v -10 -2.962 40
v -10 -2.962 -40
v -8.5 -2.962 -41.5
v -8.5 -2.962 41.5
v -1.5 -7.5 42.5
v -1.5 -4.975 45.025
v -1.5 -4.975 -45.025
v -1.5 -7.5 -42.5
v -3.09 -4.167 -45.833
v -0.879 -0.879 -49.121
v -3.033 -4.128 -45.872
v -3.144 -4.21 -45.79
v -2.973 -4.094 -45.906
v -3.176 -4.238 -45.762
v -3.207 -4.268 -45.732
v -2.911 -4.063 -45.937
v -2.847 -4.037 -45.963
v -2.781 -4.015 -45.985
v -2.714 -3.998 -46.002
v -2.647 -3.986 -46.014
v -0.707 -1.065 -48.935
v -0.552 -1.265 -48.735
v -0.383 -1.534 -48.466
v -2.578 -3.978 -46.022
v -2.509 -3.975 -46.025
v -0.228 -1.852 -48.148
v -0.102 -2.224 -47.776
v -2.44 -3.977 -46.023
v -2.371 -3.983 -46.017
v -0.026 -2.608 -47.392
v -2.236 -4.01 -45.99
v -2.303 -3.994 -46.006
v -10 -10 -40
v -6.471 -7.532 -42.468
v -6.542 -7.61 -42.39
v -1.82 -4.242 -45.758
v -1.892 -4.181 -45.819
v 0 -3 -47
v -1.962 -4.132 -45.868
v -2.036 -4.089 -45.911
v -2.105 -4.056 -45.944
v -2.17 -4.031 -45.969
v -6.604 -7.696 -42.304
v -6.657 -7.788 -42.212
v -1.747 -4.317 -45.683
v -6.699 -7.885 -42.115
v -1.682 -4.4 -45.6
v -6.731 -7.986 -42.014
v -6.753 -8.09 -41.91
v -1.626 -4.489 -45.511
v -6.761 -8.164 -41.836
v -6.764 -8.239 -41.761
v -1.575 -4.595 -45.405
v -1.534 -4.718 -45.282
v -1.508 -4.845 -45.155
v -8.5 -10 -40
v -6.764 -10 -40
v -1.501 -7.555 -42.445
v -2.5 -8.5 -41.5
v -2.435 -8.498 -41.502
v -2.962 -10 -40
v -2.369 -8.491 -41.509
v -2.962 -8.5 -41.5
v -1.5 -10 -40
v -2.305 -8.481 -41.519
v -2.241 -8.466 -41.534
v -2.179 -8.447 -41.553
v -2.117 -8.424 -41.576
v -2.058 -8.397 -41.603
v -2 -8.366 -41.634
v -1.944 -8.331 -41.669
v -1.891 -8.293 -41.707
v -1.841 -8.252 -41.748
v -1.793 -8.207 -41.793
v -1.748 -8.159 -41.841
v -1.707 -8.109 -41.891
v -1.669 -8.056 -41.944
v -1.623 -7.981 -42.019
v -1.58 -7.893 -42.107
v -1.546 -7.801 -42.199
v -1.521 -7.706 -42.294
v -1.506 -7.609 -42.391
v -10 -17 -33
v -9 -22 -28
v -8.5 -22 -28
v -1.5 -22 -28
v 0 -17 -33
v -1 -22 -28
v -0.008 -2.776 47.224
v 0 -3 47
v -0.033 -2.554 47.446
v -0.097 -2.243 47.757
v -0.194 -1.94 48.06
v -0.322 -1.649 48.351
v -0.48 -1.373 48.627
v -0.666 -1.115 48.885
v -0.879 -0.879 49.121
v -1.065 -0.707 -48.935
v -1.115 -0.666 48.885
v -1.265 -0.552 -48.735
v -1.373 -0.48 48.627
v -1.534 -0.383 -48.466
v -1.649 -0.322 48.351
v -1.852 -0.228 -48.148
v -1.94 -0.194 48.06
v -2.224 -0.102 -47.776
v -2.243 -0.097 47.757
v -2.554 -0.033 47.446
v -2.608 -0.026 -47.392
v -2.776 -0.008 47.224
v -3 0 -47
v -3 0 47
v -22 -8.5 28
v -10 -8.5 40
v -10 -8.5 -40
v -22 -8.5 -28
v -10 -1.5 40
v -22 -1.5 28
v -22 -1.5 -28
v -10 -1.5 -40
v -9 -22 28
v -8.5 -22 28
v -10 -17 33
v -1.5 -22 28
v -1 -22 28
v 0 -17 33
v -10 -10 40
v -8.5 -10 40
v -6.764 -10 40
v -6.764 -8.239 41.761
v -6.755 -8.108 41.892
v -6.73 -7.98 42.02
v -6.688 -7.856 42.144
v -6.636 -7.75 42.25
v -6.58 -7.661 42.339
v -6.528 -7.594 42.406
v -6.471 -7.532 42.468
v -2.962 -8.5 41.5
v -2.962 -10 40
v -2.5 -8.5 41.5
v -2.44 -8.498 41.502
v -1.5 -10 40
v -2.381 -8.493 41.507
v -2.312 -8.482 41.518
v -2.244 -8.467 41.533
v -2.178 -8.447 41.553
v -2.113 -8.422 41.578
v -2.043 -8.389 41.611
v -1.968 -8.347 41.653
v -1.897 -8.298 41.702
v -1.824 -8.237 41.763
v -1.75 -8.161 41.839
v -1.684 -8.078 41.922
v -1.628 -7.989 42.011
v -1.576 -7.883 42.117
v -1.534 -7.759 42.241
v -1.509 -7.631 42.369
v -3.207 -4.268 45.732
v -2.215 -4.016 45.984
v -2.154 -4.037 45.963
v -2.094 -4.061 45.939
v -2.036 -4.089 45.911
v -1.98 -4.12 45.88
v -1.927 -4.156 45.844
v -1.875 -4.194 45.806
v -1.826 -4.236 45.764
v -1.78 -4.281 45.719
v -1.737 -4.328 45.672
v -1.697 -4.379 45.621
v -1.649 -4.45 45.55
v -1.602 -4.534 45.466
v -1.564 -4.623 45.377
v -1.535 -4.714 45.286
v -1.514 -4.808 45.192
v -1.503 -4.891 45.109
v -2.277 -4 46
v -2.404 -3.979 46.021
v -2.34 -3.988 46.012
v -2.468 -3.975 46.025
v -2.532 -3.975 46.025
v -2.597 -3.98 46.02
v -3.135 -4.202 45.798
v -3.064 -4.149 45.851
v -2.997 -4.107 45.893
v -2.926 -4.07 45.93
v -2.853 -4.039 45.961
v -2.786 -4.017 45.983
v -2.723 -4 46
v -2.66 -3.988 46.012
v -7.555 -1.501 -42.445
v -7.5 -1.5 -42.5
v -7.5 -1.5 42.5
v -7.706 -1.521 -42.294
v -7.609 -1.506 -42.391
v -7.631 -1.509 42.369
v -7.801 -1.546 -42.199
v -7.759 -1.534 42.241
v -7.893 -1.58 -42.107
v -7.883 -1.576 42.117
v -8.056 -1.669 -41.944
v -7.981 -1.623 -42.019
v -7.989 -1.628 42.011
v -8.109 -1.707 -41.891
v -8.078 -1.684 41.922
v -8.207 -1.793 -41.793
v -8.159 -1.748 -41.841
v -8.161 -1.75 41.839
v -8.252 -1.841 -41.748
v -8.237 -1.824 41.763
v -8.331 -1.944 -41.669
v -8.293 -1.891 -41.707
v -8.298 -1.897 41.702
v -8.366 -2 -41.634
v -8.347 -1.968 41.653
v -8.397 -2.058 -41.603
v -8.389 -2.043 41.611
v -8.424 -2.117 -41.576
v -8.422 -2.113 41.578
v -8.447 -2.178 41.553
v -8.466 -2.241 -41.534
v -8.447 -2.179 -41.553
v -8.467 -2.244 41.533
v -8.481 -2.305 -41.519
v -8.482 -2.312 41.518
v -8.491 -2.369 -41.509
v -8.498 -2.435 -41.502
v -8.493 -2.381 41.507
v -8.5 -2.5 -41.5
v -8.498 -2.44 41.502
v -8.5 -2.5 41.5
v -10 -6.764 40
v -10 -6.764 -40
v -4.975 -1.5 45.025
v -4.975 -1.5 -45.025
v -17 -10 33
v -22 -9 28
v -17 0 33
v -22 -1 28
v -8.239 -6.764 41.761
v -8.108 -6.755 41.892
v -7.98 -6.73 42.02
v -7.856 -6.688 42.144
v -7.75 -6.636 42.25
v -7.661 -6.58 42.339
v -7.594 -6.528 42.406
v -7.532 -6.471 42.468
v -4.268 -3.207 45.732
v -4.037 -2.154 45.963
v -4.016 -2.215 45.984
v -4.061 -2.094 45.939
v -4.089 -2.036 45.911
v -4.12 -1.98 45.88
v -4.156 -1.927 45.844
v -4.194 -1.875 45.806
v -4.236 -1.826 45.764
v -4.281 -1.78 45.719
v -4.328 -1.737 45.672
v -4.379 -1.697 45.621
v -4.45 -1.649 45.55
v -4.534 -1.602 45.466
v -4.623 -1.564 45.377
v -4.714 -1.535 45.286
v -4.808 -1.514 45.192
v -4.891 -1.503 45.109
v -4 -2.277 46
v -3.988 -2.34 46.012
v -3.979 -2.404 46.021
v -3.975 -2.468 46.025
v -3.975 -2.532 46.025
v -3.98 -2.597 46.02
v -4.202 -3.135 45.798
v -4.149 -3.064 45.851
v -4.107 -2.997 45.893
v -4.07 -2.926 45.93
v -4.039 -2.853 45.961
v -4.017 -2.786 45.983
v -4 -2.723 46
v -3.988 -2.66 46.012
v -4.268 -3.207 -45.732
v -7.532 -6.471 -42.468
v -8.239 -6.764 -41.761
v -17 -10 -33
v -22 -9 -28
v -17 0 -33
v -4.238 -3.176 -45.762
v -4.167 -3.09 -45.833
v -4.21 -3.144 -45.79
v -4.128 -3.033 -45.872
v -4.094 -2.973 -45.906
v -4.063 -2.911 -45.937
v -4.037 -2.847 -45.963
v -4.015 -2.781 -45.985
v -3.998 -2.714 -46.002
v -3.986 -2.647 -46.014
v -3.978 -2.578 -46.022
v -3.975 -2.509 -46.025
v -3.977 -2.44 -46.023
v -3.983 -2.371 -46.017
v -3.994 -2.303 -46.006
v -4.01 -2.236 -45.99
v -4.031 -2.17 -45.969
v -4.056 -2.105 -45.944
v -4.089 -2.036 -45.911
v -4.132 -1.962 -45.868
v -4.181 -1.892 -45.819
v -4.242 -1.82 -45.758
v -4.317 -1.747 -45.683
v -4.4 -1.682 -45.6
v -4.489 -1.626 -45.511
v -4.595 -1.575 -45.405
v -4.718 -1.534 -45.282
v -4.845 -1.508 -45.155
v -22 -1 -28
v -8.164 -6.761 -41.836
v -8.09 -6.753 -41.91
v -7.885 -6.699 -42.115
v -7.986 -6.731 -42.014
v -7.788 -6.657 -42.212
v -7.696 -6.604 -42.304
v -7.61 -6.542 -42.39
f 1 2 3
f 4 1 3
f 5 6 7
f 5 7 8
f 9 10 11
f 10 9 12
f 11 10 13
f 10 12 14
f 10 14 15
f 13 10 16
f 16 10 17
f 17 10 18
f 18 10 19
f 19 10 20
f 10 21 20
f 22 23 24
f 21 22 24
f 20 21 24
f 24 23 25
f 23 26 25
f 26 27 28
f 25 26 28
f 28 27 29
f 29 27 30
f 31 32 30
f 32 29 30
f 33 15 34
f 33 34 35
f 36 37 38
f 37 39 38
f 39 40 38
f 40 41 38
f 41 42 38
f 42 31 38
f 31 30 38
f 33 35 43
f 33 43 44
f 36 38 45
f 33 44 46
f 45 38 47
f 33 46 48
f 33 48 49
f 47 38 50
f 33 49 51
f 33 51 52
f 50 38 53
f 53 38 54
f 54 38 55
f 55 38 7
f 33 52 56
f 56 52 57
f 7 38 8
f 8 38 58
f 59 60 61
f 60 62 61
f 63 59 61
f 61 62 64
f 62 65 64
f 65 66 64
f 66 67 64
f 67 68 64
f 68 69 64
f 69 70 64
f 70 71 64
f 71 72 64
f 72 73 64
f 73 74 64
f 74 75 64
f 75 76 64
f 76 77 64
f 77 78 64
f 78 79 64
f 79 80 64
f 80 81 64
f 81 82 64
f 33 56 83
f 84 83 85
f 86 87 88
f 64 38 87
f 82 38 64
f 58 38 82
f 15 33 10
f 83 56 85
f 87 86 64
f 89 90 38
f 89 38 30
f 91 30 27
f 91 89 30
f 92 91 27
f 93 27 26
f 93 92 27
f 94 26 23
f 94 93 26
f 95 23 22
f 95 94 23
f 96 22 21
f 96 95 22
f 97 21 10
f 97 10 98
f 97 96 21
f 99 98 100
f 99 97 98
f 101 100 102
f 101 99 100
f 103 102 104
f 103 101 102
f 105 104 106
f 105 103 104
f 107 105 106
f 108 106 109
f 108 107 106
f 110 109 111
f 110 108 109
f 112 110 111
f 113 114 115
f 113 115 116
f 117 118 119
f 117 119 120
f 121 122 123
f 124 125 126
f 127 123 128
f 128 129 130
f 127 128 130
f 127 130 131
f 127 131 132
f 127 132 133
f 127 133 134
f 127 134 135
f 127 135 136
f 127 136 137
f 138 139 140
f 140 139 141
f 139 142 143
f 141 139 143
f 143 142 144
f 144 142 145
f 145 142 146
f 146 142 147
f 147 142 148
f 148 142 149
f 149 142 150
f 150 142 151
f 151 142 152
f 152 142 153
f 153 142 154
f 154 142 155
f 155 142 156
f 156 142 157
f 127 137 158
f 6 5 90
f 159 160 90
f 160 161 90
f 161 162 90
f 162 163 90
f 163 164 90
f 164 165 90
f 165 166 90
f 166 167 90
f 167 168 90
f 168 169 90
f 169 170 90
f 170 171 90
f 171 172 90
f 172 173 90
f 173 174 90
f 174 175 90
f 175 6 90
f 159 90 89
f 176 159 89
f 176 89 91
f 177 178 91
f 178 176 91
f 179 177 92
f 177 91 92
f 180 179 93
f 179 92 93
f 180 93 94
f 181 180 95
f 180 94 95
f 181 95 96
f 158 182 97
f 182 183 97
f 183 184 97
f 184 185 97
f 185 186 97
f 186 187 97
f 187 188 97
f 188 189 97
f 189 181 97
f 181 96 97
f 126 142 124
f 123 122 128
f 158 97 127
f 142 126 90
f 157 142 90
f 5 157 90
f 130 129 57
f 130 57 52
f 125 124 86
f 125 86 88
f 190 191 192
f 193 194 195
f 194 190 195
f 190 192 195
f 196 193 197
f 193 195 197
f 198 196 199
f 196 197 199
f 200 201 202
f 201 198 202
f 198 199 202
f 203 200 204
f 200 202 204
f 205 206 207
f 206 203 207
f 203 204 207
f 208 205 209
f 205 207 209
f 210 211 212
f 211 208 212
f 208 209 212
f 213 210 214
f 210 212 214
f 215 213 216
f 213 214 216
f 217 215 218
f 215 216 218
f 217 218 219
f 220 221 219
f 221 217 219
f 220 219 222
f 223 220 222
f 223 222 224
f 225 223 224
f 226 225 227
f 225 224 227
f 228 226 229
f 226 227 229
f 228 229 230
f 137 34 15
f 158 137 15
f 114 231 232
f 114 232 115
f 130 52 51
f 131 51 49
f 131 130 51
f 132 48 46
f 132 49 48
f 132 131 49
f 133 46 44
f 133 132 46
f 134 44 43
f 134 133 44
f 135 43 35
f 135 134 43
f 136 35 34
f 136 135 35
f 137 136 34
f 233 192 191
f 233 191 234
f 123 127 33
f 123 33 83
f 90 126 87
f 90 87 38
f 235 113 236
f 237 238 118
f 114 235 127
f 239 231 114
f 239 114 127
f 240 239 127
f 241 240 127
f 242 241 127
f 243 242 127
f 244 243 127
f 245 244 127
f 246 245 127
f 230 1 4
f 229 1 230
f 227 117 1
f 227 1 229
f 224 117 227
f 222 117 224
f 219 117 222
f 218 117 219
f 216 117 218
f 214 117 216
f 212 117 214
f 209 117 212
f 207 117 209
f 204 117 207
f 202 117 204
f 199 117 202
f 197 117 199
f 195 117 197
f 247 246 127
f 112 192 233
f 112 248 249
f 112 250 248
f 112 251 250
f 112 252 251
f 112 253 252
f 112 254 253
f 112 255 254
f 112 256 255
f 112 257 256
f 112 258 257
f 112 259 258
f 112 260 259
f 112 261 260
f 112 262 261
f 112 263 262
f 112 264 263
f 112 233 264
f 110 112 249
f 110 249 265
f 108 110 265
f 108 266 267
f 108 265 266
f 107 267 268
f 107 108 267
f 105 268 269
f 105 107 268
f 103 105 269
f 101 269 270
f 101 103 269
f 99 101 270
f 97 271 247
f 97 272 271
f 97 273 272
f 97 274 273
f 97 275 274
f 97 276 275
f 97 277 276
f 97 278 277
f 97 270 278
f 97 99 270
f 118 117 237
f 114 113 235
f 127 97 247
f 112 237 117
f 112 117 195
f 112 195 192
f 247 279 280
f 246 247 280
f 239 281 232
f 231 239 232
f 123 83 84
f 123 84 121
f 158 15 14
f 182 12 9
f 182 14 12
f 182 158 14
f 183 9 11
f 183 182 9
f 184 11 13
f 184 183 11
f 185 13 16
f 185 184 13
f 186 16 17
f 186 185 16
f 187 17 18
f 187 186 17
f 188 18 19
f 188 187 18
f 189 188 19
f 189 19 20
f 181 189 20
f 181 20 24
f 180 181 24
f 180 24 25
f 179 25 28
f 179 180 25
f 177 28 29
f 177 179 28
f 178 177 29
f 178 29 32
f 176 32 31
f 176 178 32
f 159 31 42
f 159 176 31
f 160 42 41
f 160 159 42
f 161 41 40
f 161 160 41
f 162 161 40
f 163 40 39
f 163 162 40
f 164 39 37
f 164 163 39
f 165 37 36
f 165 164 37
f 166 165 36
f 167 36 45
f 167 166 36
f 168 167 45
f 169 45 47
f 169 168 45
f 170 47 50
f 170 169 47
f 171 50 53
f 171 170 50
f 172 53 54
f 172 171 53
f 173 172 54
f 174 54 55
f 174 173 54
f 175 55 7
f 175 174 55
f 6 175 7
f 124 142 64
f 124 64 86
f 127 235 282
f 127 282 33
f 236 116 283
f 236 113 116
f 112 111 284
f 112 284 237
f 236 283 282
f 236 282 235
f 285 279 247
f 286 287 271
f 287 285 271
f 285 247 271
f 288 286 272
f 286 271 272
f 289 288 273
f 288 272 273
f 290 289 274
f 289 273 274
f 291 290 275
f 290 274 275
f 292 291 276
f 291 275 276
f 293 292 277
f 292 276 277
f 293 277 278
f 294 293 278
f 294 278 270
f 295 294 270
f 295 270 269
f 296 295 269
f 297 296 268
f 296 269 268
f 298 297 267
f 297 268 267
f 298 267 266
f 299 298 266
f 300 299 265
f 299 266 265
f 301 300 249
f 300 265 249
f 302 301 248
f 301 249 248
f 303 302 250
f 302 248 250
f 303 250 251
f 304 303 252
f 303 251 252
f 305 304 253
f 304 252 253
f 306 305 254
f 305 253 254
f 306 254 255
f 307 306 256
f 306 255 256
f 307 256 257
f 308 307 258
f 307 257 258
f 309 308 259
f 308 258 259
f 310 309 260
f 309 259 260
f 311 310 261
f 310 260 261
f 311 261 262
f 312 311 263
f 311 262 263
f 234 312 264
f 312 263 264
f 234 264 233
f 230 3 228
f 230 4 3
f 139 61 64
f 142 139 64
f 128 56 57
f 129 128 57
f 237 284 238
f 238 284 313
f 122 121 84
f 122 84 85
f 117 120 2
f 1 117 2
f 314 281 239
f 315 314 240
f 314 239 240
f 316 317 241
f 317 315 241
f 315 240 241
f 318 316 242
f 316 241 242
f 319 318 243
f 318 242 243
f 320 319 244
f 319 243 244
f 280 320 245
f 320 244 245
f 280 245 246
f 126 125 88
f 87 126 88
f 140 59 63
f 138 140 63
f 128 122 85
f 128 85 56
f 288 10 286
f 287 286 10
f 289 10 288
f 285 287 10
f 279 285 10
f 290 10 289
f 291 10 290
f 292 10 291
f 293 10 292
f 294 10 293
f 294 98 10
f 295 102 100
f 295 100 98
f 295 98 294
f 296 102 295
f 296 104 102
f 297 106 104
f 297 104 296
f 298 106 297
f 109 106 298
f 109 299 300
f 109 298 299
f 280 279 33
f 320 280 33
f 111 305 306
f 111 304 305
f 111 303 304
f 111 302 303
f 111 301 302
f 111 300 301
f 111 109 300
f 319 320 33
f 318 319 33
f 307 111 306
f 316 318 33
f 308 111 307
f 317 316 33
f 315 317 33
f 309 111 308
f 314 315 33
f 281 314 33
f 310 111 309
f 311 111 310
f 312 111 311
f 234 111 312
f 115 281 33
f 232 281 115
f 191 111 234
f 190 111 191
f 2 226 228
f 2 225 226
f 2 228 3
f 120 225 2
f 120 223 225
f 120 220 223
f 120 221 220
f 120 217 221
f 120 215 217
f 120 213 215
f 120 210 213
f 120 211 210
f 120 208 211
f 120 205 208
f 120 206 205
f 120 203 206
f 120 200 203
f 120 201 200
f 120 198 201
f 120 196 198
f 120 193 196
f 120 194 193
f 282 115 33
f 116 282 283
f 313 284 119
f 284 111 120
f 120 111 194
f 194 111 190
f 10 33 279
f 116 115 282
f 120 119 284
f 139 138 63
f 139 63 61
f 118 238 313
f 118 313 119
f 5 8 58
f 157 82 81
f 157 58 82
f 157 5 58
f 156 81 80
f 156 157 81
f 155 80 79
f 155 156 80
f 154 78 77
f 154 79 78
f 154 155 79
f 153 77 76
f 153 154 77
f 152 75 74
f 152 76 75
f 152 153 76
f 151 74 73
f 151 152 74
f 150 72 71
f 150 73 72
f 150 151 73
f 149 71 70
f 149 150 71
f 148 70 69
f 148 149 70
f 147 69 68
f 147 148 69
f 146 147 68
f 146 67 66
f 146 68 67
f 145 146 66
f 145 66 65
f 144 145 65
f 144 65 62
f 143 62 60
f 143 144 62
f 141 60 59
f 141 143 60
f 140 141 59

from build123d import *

# Parameters (mm, degrees)
F1_DEPTH   = 50
F2_SIZE2   = 1
F2_SIZE    = 5
F2_2_SIZE2 = 1
F2_2_SIZE  = 5
F3_SIZE2   = 5
F3_SIZE    = 1
F3_2_SIZE2 = 5
F3_2_SIZE  = 1
F4_R       = 1
F7_DEPTH   = 25
F8_DEPTH   = 25


with BuildPart() as f1:
    # F0 (on Top) → F1 (new body, symmetric)
    with BuildSketch(Plane.XY):
        with BuildLine():
            Line((-3, 0), (-22, 0))
            Line((-22, 0), (-22, -1.5))
            Line((-22, -1.5), (-10, -1.5))
            Line((-10, -1.5), (-10, -2.9619401321))
            Line((-10, -2.9619401321), (-8.5, -2.9619401321))
            Line((-8.5, -2.9619401321), (-8.5, -1.5))
            Line((-8.5, -1.5), (-2.5606601718, -1.5))
            Line((-2.5606601718, -1.5), (-7.8245233162, -6.7638631444))
            Line((-7.8245233162, -6.7638631444), (-10, -6.7638631444))
            Line((-10, -6.7638631444), (-10, -8.5))
            Line((-10, -8.5), (-22, -8.5))
            Line((-22, -8.5), (-22, -10))
            Line((-22, -10), (-10, -10))
            Line((-10, -10), (-10, -22))
            Line((-10, -22), (-8.5, -22))
            Line((-8.5, -22), (-8.5, -10))
            Line((-8.5, -10), (-6.7638631444, -10))
            Line((-6.7638631444, -10), (-6.7638631444, -7.8245233162))
            Line((-6.7638631444, -7.8245233162), (-1.5, -2.5606601718))
            Line((-1.5, -2.5606601718), (-1.5, -8.5))
            Line((-1.5, -8.5), (-2.9619401321, -8.5))
            Line((-2.9619401321, -8.5), (-2.9619401321, -10))
            Line((-2.9619401321, -10), (-1.5, -10))
            Line((-1.5, -10), (-1.5, -22))
            Line((-1.5, -22), (0, -22))
            Line((0, -22), (0, -3))
            ThreePointArc((0, -3), (-0.8786796564, -0.8786796564), (-3, 0))
        make_face()
    extrude(amount=F1_DEPTH, both=True)

    # F2
    f2_edges = [f1.edges().sort_by_distance(p)[0] for p in [
        (-22, -10, 0),
    ]]
    f2_side = f1.faces().sort_by_distance((-16, -10, 0))[0]
    chamfer(f2_edges, length=F2_SIZE, length2=F2_SIZE2, reference=f2_side)

    # F2#2
    f2_2_edges = [f1.edges().sort_by_distance(p)[0] for p in [
        (0, -22, 0),
    ]]
    f2_2_side = f1.faces().sort_by_distance((0, -12.5, 0))[0]
    chamfer(f2_2_edges, length=F2_2_SIZE, length2=F2_2_SIZE2, reference=f2_2_side)

    # F3
    f3_edges = [f1.edges().sort_by_distance(p)[0] for p in [
        (-22, 0, 0),
    ]]
    f3_side = f1.faces().sort_by_distance((-22, -0.75, 0))[0]
    chamfer(f3_edges, length=F3_SIZE, length2=F3_SIZE2, reference=f3_side)

    # F3#2
    f3_2_edges = [f1.edges().sort_by_distance(p)[0] for p in [
        (-10, -22, 0),
    ]]
    f3_2_side = f1.faces().sort_by_distance((-9.25, -22, 0))[0]
    chamfer(f3_2_edges, length=F3_2_SIZE, length2=F3_2_SIZE2, reference=f3_2_side)

    # F4
    f4_edges = [f1.edges().sort_by_distance(p)[0] for p in [
        (-2.56066, -1.5, 0),
        (-1.5, -2.56066, 0),
        (-6.763863, -7.824523, 0),
        (-7.824523, -6.763863, 0),
        (-1.5, -8.5, 0),
        (-8.5, -1.5, 0),
    ]]
    fillet(f4_edges, radius=F4_R)

    # F5 (on Front) → F7 (cut)
    with BuildSketch(Plane.XZ):
        Polygon((0, 50), (-22, 50), (-22, 28), align=None)
        Polygon((-22, -28), (-22, -50), (0, -50), align=None)
    extrude(amount=F7_DEPTH, mode=Mode.SUBTRACT)

    # F6 (on Right) → F8 (cut)
    with BuildSketch(Plane.YZ):
        Polygon((-22, 28), (0, 50), (-22, 50), align=None)
        Polygon((-22, -50), (0, -50), (-22, -28), align=None)
    extrude(amount=-F8_DEPTH, mode=Mode.SUBTRACT)


solid = f1.part
